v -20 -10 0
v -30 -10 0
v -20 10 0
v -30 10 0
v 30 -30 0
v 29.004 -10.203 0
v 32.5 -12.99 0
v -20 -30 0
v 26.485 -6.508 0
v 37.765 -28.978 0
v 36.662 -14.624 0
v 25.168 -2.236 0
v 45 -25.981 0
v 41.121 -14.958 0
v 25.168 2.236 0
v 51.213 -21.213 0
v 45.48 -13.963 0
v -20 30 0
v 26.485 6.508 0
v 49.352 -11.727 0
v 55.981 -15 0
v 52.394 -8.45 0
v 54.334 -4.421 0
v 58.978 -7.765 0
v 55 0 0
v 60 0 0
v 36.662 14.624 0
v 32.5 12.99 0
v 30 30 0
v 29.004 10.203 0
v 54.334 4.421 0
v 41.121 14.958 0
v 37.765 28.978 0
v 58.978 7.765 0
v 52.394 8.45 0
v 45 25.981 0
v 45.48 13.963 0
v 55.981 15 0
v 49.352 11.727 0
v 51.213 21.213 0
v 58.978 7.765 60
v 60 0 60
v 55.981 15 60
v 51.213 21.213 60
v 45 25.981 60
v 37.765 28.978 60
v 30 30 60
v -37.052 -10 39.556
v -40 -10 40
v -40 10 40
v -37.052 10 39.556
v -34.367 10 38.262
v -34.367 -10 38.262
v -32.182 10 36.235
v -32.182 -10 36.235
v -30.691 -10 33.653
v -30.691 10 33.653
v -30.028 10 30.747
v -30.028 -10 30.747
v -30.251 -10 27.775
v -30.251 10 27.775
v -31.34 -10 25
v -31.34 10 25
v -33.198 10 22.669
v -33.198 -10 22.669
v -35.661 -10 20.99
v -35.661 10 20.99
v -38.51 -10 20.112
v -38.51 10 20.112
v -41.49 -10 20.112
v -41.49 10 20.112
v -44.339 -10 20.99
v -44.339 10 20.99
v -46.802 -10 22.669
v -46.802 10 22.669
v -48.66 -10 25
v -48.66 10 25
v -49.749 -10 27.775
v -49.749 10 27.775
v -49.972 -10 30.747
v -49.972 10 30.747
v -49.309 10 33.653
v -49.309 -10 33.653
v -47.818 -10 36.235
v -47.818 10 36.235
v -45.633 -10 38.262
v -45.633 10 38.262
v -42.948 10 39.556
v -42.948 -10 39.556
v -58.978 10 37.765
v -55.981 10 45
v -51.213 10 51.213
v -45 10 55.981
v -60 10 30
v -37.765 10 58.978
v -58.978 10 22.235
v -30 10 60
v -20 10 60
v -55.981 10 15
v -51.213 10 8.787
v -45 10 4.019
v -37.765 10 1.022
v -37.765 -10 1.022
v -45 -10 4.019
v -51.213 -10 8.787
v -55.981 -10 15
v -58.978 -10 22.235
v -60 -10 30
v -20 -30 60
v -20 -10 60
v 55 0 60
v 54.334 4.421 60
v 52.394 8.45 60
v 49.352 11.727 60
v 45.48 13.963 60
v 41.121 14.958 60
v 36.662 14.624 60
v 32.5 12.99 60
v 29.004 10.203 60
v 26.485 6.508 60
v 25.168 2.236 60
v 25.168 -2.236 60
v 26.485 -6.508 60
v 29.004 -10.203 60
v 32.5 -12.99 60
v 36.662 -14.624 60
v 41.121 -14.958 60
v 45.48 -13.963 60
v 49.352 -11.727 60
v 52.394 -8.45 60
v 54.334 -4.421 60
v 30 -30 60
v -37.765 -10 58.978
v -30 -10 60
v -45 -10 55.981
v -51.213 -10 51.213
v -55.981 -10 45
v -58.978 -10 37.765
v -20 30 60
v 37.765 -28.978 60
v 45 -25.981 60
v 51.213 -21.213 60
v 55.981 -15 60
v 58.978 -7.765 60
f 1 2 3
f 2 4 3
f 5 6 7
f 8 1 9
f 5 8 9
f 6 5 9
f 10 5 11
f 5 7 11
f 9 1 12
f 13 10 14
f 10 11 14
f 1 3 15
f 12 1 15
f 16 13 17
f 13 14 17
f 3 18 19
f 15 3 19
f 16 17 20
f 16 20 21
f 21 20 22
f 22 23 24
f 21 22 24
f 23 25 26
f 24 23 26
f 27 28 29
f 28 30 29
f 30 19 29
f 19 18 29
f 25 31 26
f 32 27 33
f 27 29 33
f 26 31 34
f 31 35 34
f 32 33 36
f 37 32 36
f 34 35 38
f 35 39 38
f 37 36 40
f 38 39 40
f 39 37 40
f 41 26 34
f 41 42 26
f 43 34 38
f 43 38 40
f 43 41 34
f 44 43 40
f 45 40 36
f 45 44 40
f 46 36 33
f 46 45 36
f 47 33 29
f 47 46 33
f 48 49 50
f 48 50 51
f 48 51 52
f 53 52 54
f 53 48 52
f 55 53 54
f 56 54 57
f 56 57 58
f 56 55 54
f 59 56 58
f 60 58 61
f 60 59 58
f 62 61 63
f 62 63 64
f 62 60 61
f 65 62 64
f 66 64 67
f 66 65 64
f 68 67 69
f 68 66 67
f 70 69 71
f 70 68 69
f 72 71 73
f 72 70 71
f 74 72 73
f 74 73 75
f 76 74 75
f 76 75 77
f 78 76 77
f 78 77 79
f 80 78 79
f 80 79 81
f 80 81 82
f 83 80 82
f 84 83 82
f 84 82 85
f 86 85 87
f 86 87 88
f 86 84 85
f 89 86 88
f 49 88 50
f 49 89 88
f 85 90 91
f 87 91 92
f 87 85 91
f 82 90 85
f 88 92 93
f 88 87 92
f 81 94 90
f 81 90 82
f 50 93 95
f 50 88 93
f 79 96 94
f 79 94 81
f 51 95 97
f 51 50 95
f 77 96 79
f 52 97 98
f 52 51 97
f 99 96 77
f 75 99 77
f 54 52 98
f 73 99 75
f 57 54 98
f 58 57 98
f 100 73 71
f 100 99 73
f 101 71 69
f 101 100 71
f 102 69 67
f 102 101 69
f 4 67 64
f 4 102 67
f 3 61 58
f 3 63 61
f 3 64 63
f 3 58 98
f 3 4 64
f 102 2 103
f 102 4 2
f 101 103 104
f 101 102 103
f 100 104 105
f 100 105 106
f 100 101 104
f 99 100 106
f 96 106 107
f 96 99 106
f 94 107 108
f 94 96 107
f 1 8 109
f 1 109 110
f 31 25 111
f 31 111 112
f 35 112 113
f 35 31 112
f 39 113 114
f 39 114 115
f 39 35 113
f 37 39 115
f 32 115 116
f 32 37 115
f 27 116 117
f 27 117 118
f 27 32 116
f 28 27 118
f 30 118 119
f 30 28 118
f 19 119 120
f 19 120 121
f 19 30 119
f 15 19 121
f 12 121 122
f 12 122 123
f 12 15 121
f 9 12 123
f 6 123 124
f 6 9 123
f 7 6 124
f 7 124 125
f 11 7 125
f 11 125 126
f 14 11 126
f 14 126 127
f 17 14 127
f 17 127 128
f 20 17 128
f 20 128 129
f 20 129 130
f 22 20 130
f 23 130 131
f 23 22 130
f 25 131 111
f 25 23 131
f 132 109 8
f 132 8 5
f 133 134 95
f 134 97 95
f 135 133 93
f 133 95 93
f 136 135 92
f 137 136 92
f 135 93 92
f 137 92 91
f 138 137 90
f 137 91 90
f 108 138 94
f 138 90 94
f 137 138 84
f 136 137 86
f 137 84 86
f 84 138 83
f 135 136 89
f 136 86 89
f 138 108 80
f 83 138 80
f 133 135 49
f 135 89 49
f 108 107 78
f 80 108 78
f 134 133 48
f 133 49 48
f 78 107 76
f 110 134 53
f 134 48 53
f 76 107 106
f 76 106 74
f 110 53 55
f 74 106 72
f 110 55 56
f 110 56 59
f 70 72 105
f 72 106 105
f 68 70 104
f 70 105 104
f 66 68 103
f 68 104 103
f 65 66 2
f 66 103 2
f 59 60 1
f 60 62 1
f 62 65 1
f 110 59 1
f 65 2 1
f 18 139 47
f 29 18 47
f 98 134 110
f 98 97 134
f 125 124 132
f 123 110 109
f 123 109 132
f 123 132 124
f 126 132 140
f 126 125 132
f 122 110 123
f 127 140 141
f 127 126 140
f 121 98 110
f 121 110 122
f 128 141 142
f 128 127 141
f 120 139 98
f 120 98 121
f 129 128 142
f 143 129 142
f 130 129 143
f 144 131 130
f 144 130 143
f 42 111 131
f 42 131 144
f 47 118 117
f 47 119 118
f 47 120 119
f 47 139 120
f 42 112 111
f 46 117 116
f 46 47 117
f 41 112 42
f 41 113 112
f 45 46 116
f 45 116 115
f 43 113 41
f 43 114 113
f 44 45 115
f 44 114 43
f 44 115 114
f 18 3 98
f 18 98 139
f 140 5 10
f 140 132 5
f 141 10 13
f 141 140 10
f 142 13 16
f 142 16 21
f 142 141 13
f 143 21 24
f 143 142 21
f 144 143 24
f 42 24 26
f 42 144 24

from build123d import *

# Parameters (mm, degrees)
CROQUIS4_W                 = 120
CROQUIS4_H                 = 60
SALIENTE_EXTRUIR3_DEPTH    = 60
REDONDEO1_R                = 30
CROQUIS5_W                 = 40
CROQUIS5_H                 = 20
CORTAR_EXTRUIR1_DEPTH      = 60
CORTAR_EXTRUIR2_DEPTH      = 10
CORTAR_EXTRUIR2_DEPTH_BACK = 10
CROQUIS6_R                 = 10
REDONDEO2_R                = 30
CROQUIS8_R                 = 15
CORTAR_EXTRUIR3_DEPTH      = 60


with BuildPart() as part:
    # Croquis4 → Saliente-Extruir3 (new body)
    with BuildSketch(Plane.XY):
        Rectangle(CROQUIS4_W, CROQUIS4_H)
    extrude(amount=SALIENTE_EXTRUIR3_DEPTH)

    # Redondeo1
    redondeo1_edges = [part.edges().sort_by_distance(p)[0] for p in [
        (60, -30, 30),
        (60, 30, 30),
    ]]
    fillet(redondeo1_edges, radius=REDONDEO1_R - 0.0001)  # a hair under: the kernel refuses the full size

    # Croquis5 → Cortar-Extruir1 (cut)
    with BuildSketch(Plane.XY):
        with Locations((-40, 20)):
            Rectangle(CROQUIS5_W, CROQUIS5_H)
        with Locations((-40, -20)):
            Rectangle(CROQUIS5_W, CROQUIS5_H)
    extrude(amount=CORTAR_EXTRUIR1_DEPTH, mode=Mode.SUBTRACT)

    # Croquis6 → Cortar-Extruir2 (cut, two sides: drawn at the far end of the back side and taken through both)
    with BuildSketch(Plane(origin=(0, 0, 0), x_dir=(1, 0, 0), z_dir=(0, 1, 0)).offset(-CORTAR_EXTRUIR2_DEPTH_BACK)):
        with Locations(Location((-40, -30, 0), (0, 0, 270))):
            Circle(CROQUIS6_R)
    extrude(amount=CORTAR_EXTRUIR2_DEPTH + CORTAR_EXTRUIR2_DEPTH_BACK, mode=Mode.SUBTRACT)

    # Redondeo2
    redondeo2_edges = [part.edges().sort_by_distance(p)[0] for p in [
        (-60, 0, 60),
        (-60, 0, 0),
    ]]
    fillet(redondeo2_edges, radius=REDONDEO2_R - 0.0001)  # a hair under: the kernel refuses the full size

    # Croquis8 → Cortar-Extruir3 (cut)
    with BuildSketch(Plane.XY):
        with Locations((40, 0)):
            Circle(CROQUIS8_R)
    extrude(amount=CORTAR_EXTRUIR3_DEPTH, mode=Mode.SUBTRACT)


solid = part.part
